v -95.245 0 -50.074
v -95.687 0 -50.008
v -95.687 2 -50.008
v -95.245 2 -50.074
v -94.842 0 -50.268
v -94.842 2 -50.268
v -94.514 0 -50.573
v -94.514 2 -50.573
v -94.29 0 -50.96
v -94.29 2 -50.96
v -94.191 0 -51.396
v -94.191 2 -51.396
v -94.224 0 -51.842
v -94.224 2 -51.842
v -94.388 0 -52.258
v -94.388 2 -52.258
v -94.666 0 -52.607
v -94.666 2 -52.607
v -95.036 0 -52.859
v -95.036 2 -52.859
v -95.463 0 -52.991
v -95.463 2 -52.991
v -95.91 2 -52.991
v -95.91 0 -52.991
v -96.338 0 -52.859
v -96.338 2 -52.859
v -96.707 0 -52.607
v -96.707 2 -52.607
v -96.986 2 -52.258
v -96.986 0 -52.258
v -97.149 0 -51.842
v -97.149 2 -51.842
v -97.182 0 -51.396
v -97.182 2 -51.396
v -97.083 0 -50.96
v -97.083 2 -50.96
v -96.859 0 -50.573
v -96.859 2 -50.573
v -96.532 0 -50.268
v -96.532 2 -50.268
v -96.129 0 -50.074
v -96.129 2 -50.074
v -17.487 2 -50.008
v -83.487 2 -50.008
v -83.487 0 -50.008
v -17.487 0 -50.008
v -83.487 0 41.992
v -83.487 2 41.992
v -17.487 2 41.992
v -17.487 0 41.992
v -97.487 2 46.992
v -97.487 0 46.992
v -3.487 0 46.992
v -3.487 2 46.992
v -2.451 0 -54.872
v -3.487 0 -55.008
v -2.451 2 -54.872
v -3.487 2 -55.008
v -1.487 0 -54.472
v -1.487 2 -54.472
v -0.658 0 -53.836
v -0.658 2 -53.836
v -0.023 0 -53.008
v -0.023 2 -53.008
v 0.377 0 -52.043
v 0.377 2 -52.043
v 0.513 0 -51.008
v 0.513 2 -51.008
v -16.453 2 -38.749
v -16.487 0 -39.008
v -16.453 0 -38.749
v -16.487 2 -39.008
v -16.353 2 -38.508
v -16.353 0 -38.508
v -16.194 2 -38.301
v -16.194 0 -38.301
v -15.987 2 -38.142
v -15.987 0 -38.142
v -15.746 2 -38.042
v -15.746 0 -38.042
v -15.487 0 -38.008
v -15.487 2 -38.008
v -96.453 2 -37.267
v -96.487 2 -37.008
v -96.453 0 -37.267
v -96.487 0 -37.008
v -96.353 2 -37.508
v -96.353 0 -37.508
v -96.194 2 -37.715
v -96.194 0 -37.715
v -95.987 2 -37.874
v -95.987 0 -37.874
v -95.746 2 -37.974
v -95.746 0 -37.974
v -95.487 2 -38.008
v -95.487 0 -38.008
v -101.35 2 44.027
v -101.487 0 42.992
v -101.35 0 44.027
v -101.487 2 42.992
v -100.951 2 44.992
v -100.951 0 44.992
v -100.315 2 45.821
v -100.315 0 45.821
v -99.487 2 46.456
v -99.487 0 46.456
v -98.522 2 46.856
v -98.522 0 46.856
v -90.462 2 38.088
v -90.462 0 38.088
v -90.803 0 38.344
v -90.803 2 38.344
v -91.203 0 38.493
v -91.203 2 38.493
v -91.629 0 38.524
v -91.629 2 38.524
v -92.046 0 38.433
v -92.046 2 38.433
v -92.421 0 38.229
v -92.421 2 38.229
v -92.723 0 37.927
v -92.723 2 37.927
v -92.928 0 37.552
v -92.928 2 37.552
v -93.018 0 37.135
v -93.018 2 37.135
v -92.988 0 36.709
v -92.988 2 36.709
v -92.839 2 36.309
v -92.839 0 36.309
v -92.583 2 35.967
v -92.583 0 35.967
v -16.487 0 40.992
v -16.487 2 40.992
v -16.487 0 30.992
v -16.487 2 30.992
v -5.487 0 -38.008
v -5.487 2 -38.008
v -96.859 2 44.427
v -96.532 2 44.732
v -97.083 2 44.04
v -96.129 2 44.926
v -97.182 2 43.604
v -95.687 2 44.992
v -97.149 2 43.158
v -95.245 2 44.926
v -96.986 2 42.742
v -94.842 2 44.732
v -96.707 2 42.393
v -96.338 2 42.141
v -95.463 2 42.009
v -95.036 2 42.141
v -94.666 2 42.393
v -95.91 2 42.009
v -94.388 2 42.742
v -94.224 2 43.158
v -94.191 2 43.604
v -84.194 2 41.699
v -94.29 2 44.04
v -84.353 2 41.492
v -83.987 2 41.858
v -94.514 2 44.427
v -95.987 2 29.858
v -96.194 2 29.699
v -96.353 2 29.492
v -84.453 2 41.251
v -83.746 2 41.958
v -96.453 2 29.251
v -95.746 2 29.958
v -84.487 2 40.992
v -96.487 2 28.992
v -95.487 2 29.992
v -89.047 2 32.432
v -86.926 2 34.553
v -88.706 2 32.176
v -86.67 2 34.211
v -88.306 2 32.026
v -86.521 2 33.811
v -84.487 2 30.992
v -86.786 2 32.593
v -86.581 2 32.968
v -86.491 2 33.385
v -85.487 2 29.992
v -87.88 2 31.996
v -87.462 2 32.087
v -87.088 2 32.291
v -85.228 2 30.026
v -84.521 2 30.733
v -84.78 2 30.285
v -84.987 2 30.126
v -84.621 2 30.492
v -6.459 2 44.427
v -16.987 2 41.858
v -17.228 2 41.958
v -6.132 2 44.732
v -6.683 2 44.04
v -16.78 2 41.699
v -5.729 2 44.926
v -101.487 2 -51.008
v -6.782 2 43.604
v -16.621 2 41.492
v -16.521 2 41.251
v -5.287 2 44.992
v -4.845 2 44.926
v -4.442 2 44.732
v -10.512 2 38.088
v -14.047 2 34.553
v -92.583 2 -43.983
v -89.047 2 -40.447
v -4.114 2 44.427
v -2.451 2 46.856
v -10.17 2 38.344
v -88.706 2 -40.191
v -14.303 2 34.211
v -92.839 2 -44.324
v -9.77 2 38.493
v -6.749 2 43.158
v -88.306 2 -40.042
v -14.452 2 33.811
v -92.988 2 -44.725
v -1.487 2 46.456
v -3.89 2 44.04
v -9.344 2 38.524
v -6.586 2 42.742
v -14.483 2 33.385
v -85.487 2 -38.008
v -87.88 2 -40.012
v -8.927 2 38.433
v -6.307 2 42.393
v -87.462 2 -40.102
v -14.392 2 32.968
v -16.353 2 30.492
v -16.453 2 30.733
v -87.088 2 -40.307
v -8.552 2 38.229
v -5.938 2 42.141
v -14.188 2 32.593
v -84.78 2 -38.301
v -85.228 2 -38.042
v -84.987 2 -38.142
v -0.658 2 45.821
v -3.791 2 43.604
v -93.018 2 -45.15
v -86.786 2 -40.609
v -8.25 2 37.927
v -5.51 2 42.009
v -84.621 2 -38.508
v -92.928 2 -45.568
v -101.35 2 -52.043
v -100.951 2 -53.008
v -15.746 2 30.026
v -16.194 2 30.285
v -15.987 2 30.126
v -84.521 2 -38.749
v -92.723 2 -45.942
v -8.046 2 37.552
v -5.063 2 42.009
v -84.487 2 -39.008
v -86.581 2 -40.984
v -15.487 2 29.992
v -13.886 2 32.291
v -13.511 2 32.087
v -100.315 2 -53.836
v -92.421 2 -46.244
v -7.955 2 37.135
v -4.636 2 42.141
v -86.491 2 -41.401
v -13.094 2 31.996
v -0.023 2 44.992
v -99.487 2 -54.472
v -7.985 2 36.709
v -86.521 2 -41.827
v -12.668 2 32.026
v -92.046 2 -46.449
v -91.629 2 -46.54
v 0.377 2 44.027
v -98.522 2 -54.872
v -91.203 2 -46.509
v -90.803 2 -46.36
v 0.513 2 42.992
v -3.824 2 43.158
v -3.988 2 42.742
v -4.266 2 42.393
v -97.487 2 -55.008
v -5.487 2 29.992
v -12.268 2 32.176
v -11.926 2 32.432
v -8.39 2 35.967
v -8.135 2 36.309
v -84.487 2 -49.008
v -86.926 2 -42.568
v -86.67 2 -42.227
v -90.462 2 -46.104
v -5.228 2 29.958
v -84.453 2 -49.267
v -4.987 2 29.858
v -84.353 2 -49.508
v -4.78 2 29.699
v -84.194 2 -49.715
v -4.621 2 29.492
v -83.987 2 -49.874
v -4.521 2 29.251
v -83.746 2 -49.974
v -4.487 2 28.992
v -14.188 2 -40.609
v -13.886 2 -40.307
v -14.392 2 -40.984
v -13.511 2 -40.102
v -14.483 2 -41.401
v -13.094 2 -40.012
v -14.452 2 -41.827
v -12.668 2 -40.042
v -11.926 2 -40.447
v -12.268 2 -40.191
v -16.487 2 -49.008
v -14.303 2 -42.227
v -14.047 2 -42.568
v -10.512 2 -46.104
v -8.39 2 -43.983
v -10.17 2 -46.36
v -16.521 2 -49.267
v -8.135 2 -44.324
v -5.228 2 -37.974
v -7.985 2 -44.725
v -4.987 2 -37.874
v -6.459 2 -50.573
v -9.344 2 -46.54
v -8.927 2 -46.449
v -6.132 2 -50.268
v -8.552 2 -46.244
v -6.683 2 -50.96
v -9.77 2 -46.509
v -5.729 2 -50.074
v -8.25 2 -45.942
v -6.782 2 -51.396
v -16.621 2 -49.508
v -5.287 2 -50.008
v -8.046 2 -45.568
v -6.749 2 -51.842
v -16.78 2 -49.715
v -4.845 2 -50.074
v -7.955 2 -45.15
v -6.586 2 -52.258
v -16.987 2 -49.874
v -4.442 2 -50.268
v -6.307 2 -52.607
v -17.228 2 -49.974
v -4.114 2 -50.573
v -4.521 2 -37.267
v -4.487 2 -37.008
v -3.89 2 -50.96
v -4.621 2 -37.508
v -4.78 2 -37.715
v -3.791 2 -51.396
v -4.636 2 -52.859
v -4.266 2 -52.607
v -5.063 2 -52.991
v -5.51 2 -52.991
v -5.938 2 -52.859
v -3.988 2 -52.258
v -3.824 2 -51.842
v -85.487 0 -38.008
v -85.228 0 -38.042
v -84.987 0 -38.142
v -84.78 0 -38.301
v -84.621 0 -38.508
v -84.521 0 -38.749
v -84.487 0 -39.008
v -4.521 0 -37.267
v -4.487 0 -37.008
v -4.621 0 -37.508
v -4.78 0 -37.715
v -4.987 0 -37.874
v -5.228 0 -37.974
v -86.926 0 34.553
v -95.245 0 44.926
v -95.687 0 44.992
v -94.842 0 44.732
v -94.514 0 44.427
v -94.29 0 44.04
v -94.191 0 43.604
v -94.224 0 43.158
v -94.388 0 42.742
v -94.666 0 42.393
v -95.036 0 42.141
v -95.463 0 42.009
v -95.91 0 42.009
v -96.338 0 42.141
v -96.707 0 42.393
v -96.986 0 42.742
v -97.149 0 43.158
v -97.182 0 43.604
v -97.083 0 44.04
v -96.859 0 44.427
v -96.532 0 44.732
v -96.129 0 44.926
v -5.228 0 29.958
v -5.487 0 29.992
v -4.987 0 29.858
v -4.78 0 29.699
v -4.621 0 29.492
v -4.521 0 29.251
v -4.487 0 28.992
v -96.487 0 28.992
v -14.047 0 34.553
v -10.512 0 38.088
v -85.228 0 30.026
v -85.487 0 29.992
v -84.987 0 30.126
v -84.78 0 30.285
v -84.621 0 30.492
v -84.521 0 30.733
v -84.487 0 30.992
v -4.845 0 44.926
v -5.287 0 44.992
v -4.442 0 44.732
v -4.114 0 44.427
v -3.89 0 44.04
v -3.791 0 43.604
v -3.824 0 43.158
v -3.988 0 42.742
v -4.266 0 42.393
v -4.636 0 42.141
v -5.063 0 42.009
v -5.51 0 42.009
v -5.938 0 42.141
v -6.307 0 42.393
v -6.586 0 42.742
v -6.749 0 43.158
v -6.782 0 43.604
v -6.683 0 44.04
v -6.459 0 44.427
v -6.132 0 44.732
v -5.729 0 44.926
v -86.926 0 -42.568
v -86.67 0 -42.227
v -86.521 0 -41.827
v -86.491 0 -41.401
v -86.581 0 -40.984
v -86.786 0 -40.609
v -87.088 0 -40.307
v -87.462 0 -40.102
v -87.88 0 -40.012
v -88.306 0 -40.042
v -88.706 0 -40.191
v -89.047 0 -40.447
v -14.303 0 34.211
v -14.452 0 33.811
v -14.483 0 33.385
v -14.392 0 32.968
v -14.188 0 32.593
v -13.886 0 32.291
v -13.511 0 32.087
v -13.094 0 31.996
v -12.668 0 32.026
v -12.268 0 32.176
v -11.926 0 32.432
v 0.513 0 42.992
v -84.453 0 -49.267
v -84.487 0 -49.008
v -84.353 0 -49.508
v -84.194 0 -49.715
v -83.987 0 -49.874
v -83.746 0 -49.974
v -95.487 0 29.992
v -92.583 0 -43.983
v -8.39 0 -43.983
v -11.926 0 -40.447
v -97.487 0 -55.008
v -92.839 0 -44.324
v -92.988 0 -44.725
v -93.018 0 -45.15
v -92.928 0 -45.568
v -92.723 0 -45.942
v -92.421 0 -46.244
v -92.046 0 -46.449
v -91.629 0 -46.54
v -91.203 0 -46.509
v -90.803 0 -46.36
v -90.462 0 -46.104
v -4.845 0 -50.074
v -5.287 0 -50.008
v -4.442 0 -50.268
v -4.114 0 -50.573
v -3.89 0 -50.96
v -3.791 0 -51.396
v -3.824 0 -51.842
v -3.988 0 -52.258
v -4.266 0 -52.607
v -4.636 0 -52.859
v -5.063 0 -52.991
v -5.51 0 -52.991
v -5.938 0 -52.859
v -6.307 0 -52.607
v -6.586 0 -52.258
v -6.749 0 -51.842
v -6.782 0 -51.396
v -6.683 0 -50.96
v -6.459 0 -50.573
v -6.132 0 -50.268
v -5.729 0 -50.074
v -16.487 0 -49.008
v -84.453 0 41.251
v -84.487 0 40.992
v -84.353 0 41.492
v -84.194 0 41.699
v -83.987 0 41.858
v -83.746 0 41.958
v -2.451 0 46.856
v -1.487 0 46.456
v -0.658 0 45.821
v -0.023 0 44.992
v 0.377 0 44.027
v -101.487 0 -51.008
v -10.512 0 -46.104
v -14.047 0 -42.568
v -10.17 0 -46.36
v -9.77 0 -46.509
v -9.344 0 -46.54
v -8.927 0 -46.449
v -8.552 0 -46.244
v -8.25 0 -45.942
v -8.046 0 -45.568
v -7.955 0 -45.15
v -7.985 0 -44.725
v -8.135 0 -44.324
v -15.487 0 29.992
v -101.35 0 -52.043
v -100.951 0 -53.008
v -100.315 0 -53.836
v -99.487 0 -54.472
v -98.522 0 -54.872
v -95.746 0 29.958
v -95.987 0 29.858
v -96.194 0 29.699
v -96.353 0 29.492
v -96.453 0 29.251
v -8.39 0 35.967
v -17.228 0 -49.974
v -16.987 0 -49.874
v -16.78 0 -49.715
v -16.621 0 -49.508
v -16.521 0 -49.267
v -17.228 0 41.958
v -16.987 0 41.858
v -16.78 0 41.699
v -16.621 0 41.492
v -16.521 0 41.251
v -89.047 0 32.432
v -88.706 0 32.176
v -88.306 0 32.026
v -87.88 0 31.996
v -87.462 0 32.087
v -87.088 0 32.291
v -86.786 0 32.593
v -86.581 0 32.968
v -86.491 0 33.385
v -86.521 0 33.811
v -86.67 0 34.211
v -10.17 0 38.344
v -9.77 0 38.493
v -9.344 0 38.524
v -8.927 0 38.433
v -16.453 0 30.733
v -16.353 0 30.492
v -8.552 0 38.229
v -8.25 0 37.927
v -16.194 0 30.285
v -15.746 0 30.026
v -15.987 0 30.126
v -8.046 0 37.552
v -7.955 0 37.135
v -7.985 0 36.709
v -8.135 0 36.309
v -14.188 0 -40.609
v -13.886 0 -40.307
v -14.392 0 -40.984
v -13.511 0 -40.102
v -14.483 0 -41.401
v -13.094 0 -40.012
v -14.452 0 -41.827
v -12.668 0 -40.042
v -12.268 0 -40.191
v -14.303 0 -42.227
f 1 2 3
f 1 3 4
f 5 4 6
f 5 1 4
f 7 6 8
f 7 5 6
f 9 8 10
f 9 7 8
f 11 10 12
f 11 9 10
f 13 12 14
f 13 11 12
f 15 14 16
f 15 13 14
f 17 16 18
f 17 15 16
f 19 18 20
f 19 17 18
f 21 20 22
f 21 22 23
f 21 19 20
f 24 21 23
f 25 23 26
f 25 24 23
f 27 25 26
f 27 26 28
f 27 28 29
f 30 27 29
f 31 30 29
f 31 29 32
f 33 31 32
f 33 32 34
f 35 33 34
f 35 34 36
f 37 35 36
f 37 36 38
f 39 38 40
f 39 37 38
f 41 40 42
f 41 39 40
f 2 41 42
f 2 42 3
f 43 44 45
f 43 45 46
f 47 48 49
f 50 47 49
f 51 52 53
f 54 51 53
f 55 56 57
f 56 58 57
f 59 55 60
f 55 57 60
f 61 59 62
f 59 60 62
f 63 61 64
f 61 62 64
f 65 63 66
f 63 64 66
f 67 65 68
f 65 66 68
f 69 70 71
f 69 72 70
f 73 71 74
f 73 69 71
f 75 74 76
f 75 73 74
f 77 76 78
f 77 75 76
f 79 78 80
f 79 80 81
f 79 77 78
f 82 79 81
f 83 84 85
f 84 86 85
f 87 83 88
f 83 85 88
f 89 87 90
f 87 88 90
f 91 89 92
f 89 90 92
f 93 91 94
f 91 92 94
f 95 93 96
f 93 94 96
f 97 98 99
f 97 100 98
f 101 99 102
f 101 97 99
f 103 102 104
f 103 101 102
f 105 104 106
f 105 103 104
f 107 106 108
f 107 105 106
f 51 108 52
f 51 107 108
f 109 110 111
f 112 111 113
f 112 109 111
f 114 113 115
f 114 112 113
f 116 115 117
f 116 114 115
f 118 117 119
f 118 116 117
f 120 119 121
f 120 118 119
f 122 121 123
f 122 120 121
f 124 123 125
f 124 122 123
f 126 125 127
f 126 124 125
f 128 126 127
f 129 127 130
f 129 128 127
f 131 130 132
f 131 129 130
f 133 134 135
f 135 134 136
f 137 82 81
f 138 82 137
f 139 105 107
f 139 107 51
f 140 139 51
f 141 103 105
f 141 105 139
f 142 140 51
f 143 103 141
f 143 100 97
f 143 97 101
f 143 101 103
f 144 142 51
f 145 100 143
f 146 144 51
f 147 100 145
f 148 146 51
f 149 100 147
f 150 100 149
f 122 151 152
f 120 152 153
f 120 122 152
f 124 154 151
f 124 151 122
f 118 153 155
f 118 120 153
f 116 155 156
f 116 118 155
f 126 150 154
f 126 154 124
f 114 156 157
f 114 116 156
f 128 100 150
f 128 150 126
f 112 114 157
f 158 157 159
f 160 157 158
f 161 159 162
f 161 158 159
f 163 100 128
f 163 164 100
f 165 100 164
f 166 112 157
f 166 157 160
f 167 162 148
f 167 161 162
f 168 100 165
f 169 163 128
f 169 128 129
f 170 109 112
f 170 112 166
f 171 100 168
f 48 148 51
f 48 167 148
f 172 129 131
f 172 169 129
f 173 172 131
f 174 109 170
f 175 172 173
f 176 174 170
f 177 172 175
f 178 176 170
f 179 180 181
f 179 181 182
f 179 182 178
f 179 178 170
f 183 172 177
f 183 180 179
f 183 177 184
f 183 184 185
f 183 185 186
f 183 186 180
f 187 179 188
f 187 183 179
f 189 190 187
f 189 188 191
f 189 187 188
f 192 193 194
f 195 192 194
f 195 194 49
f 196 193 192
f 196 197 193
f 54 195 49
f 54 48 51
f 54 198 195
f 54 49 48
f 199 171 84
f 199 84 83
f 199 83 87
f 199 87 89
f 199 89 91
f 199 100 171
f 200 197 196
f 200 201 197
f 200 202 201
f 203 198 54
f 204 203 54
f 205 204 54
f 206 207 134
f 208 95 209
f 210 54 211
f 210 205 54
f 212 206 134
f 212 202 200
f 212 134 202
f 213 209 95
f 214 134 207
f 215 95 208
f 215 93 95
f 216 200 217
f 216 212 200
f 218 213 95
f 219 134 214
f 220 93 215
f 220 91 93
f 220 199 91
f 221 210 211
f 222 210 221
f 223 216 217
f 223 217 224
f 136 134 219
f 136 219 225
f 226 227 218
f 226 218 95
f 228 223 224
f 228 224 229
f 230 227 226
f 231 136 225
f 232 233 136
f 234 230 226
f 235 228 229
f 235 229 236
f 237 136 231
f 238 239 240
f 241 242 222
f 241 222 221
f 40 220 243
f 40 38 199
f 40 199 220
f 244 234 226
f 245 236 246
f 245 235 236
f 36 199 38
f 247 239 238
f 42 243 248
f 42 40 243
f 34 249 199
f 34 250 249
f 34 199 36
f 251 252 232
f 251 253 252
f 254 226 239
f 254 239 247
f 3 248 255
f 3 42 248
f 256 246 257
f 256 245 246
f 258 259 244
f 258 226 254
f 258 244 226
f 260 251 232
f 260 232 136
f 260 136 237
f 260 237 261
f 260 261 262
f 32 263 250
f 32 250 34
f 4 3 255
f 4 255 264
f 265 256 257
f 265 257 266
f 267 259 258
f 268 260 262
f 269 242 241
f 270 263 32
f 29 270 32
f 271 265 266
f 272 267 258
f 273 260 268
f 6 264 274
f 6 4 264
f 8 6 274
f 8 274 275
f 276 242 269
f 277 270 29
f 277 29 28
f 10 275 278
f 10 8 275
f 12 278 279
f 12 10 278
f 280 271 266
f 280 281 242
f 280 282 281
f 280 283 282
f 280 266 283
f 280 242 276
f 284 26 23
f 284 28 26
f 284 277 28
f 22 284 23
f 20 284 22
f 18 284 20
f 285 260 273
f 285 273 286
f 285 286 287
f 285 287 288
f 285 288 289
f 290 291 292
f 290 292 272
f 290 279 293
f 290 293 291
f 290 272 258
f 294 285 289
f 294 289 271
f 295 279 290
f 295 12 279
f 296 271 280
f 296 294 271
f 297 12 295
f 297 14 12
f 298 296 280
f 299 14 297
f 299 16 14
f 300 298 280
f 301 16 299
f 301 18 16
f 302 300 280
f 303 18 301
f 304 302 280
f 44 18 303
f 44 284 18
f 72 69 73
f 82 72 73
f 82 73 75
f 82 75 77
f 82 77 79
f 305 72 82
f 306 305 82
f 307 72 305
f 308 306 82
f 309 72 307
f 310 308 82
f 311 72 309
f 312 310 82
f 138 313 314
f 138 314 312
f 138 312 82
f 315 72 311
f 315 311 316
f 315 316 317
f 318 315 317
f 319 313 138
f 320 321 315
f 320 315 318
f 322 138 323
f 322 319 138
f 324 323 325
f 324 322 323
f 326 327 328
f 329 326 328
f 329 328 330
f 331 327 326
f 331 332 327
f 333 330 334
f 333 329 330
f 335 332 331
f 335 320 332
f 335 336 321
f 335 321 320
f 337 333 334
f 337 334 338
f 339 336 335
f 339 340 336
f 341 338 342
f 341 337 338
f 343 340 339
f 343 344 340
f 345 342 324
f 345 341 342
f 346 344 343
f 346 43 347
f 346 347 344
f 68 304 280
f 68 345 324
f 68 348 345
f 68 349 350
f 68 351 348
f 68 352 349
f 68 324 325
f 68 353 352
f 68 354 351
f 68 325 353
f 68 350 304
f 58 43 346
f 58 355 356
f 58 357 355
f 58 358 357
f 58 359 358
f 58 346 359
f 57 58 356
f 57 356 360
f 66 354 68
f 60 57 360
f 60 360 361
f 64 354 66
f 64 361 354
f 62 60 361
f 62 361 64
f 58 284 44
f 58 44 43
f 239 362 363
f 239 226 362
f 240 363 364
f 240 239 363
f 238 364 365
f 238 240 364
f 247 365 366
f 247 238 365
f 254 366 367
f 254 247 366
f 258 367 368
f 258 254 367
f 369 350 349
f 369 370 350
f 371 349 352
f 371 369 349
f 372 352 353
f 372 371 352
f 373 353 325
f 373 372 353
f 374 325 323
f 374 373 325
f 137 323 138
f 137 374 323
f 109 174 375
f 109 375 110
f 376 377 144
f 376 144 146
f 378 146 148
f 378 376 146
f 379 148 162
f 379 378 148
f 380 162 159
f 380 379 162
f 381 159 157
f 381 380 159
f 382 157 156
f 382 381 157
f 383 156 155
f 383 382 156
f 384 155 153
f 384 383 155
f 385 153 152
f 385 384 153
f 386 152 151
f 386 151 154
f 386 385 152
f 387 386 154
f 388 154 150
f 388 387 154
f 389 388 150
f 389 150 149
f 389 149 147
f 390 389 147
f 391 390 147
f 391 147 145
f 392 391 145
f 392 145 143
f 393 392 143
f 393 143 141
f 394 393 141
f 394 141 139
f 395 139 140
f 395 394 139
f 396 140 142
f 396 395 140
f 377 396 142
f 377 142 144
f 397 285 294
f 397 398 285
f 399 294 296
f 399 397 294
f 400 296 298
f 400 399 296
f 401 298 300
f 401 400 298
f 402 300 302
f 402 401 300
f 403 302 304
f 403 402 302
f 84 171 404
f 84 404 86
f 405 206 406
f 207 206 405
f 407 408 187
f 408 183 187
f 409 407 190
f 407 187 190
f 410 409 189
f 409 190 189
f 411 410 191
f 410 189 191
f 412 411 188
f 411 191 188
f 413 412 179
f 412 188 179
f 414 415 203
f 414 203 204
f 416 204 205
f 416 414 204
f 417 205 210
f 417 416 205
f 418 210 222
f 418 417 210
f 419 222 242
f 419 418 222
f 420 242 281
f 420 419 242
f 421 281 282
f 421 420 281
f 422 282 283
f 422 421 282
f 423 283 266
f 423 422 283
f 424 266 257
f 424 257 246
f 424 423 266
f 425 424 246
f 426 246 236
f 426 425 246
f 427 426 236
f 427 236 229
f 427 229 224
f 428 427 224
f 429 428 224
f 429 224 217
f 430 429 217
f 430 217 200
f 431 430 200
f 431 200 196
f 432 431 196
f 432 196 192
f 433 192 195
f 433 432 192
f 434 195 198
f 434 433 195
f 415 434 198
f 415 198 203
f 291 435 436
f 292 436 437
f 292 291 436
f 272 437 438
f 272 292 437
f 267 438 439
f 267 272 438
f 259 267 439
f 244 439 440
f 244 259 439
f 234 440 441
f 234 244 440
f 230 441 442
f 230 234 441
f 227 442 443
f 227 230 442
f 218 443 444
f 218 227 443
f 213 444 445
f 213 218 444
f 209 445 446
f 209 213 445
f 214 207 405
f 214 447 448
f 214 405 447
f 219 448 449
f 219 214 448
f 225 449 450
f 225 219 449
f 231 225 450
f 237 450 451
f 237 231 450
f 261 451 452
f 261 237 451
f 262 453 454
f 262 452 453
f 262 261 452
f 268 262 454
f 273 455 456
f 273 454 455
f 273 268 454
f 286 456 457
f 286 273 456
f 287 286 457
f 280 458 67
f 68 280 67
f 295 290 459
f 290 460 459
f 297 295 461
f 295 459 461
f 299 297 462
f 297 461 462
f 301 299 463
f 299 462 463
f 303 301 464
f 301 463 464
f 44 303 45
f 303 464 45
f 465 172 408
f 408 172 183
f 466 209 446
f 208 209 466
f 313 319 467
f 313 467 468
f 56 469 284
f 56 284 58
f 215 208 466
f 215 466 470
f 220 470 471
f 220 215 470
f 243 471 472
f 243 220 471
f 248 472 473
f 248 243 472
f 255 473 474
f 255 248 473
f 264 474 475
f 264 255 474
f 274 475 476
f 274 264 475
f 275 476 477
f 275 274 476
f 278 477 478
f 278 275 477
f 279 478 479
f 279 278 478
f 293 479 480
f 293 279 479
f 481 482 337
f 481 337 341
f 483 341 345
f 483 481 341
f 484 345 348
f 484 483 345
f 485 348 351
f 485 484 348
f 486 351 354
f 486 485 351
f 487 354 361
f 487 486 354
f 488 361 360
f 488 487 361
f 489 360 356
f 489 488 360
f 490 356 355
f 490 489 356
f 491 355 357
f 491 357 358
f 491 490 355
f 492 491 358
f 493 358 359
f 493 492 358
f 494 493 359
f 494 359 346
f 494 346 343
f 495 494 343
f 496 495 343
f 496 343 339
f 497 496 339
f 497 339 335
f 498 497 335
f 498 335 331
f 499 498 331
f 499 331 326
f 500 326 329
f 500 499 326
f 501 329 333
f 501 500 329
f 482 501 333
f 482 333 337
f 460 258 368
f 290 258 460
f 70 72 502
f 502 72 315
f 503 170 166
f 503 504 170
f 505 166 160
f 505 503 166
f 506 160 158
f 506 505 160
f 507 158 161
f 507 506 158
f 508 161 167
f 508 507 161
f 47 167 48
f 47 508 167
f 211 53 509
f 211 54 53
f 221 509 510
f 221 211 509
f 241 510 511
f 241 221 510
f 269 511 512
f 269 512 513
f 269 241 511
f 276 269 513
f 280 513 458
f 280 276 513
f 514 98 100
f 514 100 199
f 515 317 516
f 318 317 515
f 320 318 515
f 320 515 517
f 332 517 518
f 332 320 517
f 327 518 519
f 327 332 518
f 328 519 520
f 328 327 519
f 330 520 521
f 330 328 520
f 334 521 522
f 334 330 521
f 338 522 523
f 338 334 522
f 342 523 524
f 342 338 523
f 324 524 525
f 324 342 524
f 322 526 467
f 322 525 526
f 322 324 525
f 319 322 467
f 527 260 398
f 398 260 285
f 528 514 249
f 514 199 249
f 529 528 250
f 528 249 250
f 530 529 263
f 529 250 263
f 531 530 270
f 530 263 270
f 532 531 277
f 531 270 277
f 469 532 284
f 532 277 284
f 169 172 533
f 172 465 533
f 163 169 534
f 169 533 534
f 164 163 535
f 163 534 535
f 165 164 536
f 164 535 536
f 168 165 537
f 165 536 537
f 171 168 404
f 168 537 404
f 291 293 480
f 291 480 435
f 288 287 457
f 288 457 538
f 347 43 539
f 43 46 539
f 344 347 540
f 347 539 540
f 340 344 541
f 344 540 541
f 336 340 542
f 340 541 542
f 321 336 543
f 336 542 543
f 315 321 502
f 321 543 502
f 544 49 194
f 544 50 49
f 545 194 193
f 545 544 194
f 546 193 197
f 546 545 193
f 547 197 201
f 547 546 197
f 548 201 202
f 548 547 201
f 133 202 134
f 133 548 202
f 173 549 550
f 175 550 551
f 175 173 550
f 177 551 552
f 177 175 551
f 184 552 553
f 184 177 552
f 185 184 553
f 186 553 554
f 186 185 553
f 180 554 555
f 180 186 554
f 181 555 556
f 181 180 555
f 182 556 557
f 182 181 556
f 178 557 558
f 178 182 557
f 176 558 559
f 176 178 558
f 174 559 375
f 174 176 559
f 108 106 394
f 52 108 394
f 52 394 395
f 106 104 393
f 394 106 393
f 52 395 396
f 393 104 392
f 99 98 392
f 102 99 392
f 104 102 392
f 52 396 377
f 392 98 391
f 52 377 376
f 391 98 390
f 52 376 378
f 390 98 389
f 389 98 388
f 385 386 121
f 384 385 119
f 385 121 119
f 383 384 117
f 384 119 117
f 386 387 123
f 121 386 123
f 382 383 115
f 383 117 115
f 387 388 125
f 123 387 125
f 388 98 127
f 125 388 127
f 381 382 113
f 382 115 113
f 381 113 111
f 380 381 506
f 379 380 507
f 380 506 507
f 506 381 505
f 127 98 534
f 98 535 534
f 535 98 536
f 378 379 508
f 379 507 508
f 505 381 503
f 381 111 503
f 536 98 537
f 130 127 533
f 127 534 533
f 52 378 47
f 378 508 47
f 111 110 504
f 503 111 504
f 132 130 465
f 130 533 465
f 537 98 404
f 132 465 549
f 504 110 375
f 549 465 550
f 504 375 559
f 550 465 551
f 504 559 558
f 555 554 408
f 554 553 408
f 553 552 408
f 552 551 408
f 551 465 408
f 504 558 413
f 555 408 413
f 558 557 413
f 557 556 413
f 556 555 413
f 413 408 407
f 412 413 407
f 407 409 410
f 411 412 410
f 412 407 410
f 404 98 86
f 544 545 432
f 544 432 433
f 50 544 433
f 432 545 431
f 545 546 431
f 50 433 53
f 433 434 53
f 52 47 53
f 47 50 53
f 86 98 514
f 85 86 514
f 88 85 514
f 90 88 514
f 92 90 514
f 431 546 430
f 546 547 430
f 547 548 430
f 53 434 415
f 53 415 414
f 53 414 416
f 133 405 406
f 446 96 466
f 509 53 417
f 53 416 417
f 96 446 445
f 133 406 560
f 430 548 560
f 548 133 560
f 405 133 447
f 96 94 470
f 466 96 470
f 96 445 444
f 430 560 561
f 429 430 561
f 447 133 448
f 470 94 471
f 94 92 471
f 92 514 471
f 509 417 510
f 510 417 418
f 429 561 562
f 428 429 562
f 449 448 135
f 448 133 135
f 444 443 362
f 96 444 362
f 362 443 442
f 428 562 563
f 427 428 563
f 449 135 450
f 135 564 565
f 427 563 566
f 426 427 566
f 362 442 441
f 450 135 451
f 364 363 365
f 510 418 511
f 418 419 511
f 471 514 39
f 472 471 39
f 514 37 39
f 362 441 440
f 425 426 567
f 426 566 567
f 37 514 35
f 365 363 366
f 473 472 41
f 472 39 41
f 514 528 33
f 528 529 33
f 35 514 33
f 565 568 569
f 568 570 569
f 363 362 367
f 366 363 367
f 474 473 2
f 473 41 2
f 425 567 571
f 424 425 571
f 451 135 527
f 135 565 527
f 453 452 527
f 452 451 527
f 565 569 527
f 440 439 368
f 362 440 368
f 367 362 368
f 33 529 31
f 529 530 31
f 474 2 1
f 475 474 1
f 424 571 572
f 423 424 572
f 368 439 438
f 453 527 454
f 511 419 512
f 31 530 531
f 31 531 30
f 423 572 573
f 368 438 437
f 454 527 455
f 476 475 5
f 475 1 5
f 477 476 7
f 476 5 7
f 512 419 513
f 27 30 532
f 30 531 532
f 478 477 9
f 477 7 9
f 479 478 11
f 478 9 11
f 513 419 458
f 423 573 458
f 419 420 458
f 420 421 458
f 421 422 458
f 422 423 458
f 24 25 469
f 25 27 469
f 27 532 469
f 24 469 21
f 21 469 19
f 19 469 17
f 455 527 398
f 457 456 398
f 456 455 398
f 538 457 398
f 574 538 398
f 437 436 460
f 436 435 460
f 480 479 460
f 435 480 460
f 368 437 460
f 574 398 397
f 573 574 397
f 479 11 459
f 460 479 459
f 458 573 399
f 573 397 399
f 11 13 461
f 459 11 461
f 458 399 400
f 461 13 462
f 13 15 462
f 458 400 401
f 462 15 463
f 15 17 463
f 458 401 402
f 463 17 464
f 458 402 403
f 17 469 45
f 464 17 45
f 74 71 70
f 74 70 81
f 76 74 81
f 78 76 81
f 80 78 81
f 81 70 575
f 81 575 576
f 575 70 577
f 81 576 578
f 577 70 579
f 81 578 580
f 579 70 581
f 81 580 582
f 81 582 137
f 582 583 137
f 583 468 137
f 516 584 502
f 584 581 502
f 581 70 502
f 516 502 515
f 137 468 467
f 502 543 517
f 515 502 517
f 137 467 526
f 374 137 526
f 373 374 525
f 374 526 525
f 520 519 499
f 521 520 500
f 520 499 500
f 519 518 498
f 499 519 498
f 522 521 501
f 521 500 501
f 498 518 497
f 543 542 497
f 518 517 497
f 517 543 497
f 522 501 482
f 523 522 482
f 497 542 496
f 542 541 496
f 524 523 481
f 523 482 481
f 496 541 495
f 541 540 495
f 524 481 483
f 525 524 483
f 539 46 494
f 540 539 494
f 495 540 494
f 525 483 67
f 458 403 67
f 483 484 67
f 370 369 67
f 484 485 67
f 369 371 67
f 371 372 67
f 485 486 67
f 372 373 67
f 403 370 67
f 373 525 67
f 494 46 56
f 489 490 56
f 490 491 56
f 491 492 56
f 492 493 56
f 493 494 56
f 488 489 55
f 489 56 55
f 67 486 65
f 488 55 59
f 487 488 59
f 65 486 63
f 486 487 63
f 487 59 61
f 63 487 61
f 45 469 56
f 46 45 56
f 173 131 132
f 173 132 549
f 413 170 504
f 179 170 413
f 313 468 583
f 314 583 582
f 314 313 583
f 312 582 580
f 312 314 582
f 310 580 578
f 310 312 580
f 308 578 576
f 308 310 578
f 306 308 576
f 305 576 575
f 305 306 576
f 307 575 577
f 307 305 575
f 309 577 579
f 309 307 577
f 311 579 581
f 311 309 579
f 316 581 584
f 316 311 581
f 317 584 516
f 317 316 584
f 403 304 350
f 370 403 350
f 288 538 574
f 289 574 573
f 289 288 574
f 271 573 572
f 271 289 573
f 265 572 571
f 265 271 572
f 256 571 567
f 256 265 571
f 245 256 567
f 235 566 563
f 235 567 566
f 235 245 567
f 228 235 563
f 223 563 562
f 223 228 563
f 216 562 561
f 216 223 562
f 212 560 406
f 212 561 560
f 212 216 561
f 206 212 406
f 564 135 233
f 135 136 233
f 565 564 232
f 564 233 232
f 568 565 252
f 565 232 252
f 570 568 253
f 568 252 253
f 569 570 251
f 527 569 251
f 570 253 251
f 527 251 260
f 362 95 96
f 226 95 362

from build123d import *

# Parameters (mm, degrees)
SKETCH_1_W          = 102
SKETCH_1_H          = 102
SKETCH_1_R          = 1.5
SKETCH_1_R_2        = 1
EXTRUDE_1_DEPTH     = 2
SKETCH_2_W          = 92
SKETCH_2_H          = 68
CUT_EXTRUDE_1_DEPTH = 10
SKETCH_3_W          = 68
SKETCH_3_H          = 92
CUT_EXTRUDE_2_DEPTH = 10
FILLET_1_R          = 4
CUT_EXTRUDE_3_DEPTH = 10
FILLET_2_R          = 1


with BuildPart() as part:
    # 草图1 → 凸台-拉伸1 (new body)
    with BuildSketch(Plane(origin=(0, 0, 0), x_dir=(1, 0, 0), z_dir=(0, 1, 0))):
        with Locations((-50.486691813, 4.007835052)):
            Rectangle(SKETCH_1_W, SKETCH_1_H)
        with Locations(Location((-95.686691813, -43.492164948, 0), (0, 0, 270))):
            Circle(SKETCH_1_R, mode=Mode.SUBTRACT)
        with Locations(Location((-95.686691813, 51.507835052, 0), (0, 0, 270))):
            Circle(SKETCH_1_R, mode=Mode.SUBTRACT)
        with Locations(Location((-5.286691813, -43.492164948, 0), (0, 0, 270))):
            Circle(SKETCH_1_R, mode=Mode.SUBTRACT)
        with Locations(Location((-5.286691813, 51.507835052, 0), (0, 0, 270))):
            Circle(SKETCH_1_R, mode=Mode.SUBTRACT)
        with Locations(Location((-90.486691813, -35.992164948, 0), (0, 0, 270))):
            Circle(SKETCH_1_R_2, mode=Mode.SUBTRACT)
        with Locations(Location((-90.486691813, 44.007835052, 0), (0, 0, 270))):
            Circle(SKETCH_1_R_2, mode=Mode.SUBTRACT)
        with Locations(Location((-10.486691813, -35.992164948, 0), (0, 0, 270))):
            Circle(SKETCH_1_R_2, mode=Mode.SUBTRACT)
        with Locations(Location((-10.486691813, 44.007835052, 0), (0, 0, 270))):
            Circle(SKETCH_1_R_2, mode=Mode.SUBTRACT)
    extrude(amount=EXTRUDE_1_DEPTH)

    # 草图2 → 切除-拉伸1 (cut)
    with BuildSketch(Plane(origin=(0, 2, 0), x_dir=(1, 0, 0), z_dir=(0, 1, 0))):
        with Locations((-50.486691813, 4.007835052)):
            Rectangle(SKETCH_2_W, SKETCH_2_H)
    extrude(amount=-CUT_EXTRUDE_1_DEPTH, mode=Mode.SUBTRACT)

    # 草图3 → 切除-拉伸2 (cut)
    with BuildSketch(Plane(origin=(0, 2, 0), x_dir=(1, 0, 0), z_dir=(0, 1, 0))):
        with Locations((-50.486691813, 4.007835052)):
            Rectangle(SKETCH_3_W, SKETCH_3_H)
    extrude(amount=-CUT_EXTRUDE_2_DEPTH, mode=Mode.SUBTRACT)

    # 圆角1
    fillet_1_edges = [part.edges().sort_by_distance(p)[0] for p in [
        (0.513308187, 1, -55.007835052),
        (0.513308187, 1, 46.992164948),
        (-101.486691813, 1, 46.992164948),
        (-101.486691813, 1, -55.007835052),
    ]]
    fillet(fillet_1_edges, radius=FILLET_1_R)

    # 草图4 → 切除-拉伸3 (cut)
    with BuildSketch(Plane(origin=(0, 2, 0), x_dir=(1, 0, 0), z_dir=(0, 1, 0))):
        with BuildLine():
            Line((-89.047351985, 40.44717488), (-92.58288589, 43.982708786))
            ThreePointArc((-92.58288589, 43.982708786), (-92.58288589, 46.104029129), (-90.461565547, 46.104029129))
            Line((-90.461565547, 46.104029129), (-86.926031641, 42.568495223))
            ThreePointArc((-86.926031641, 42.568495223), (-86.926031641, 40.44717488), (-89.047351985, 40.44717488))
        make_face()
        with BuildLine():
            Line((-14.047351985, 42.568495223), (-10.511818079, 46.104029129))
            ThreePointArc((-10.511818079, 46.104029129), (-8.390497735, 46.104029129), (-8.390497735, 43.982708786))
            Line((-8.390497735, 43.982708786), (-11.926031641, 40.44717488))
            ThreePointArc((-11.926031641, 40.44717488), (-14.047351985, 40.44717488), (-14.047351985, 42.568495223))
        make_face()
        with BuildLine():
            Line((-11.926031641, -32.431504777), (-8.390497735, -35.967038683))
            ThreePointArc((-8.390497735, -35.967038683), (-8.390497735, -38.088359026), (-10.511818079, -38.088359026))
            Line((-10.511818079, -38.088359026), (-14.047351985, -34.55282512))
            ThreePointArc((-14.047351985, -34.55282512), (-14.047351985, -32.431504777), (-11.926031641, -32.431504777))
        make_face()
        with BuildLine():
            Line((-86.926031641, -34.55282512), (-90.461565547, -38.088359026))
            ThreePointArc((-90.461565547, -38.088359026), (-92.58288589, -38.088359026), (-92.58288589, -35.967038683))
            Line((-92.58288589, -35.967038683), (-89.047351985, -32.431504777))
            ThreePointArc((-89.047351985, -32.431504777), (-86.926031641, -32.431504777), (-86.926031641, -34.55282512))
        make_face()
    extrude(amount=-CUT_EXTRUDE_3_DEPTH, mode=Mode.SUBTRACT)

    # 圆角2
    fillet_2_edges = [part.edges().sort_by_distance(p)[0] for p in [
        (-96.486691813, 1, 29.992164948),
        (-96.486691813, 1, -38.007835052),
        (-4.486691813, 1, -38.007835052),
        (-4.486691813, 1, 29.992164948),
        (-16.486691813, 1, 29.992164948),
        (-84.486691813, 1, 29.992164948),
        (-84.486691813, 1, -38.007835052),
        (-16.486691813, 1, -50.007835052),
        (-16.486691813, 1, -38.007835052),
        (-84.486691813, 1, 41.992164948),
        (-84.486691813, 1, -50.007835052),
        (-16.486691813, 1, 41.992164948),
    ]]
    fillet(fillet_2_edges, radius=FILLET_2_R)


solid = part.part
